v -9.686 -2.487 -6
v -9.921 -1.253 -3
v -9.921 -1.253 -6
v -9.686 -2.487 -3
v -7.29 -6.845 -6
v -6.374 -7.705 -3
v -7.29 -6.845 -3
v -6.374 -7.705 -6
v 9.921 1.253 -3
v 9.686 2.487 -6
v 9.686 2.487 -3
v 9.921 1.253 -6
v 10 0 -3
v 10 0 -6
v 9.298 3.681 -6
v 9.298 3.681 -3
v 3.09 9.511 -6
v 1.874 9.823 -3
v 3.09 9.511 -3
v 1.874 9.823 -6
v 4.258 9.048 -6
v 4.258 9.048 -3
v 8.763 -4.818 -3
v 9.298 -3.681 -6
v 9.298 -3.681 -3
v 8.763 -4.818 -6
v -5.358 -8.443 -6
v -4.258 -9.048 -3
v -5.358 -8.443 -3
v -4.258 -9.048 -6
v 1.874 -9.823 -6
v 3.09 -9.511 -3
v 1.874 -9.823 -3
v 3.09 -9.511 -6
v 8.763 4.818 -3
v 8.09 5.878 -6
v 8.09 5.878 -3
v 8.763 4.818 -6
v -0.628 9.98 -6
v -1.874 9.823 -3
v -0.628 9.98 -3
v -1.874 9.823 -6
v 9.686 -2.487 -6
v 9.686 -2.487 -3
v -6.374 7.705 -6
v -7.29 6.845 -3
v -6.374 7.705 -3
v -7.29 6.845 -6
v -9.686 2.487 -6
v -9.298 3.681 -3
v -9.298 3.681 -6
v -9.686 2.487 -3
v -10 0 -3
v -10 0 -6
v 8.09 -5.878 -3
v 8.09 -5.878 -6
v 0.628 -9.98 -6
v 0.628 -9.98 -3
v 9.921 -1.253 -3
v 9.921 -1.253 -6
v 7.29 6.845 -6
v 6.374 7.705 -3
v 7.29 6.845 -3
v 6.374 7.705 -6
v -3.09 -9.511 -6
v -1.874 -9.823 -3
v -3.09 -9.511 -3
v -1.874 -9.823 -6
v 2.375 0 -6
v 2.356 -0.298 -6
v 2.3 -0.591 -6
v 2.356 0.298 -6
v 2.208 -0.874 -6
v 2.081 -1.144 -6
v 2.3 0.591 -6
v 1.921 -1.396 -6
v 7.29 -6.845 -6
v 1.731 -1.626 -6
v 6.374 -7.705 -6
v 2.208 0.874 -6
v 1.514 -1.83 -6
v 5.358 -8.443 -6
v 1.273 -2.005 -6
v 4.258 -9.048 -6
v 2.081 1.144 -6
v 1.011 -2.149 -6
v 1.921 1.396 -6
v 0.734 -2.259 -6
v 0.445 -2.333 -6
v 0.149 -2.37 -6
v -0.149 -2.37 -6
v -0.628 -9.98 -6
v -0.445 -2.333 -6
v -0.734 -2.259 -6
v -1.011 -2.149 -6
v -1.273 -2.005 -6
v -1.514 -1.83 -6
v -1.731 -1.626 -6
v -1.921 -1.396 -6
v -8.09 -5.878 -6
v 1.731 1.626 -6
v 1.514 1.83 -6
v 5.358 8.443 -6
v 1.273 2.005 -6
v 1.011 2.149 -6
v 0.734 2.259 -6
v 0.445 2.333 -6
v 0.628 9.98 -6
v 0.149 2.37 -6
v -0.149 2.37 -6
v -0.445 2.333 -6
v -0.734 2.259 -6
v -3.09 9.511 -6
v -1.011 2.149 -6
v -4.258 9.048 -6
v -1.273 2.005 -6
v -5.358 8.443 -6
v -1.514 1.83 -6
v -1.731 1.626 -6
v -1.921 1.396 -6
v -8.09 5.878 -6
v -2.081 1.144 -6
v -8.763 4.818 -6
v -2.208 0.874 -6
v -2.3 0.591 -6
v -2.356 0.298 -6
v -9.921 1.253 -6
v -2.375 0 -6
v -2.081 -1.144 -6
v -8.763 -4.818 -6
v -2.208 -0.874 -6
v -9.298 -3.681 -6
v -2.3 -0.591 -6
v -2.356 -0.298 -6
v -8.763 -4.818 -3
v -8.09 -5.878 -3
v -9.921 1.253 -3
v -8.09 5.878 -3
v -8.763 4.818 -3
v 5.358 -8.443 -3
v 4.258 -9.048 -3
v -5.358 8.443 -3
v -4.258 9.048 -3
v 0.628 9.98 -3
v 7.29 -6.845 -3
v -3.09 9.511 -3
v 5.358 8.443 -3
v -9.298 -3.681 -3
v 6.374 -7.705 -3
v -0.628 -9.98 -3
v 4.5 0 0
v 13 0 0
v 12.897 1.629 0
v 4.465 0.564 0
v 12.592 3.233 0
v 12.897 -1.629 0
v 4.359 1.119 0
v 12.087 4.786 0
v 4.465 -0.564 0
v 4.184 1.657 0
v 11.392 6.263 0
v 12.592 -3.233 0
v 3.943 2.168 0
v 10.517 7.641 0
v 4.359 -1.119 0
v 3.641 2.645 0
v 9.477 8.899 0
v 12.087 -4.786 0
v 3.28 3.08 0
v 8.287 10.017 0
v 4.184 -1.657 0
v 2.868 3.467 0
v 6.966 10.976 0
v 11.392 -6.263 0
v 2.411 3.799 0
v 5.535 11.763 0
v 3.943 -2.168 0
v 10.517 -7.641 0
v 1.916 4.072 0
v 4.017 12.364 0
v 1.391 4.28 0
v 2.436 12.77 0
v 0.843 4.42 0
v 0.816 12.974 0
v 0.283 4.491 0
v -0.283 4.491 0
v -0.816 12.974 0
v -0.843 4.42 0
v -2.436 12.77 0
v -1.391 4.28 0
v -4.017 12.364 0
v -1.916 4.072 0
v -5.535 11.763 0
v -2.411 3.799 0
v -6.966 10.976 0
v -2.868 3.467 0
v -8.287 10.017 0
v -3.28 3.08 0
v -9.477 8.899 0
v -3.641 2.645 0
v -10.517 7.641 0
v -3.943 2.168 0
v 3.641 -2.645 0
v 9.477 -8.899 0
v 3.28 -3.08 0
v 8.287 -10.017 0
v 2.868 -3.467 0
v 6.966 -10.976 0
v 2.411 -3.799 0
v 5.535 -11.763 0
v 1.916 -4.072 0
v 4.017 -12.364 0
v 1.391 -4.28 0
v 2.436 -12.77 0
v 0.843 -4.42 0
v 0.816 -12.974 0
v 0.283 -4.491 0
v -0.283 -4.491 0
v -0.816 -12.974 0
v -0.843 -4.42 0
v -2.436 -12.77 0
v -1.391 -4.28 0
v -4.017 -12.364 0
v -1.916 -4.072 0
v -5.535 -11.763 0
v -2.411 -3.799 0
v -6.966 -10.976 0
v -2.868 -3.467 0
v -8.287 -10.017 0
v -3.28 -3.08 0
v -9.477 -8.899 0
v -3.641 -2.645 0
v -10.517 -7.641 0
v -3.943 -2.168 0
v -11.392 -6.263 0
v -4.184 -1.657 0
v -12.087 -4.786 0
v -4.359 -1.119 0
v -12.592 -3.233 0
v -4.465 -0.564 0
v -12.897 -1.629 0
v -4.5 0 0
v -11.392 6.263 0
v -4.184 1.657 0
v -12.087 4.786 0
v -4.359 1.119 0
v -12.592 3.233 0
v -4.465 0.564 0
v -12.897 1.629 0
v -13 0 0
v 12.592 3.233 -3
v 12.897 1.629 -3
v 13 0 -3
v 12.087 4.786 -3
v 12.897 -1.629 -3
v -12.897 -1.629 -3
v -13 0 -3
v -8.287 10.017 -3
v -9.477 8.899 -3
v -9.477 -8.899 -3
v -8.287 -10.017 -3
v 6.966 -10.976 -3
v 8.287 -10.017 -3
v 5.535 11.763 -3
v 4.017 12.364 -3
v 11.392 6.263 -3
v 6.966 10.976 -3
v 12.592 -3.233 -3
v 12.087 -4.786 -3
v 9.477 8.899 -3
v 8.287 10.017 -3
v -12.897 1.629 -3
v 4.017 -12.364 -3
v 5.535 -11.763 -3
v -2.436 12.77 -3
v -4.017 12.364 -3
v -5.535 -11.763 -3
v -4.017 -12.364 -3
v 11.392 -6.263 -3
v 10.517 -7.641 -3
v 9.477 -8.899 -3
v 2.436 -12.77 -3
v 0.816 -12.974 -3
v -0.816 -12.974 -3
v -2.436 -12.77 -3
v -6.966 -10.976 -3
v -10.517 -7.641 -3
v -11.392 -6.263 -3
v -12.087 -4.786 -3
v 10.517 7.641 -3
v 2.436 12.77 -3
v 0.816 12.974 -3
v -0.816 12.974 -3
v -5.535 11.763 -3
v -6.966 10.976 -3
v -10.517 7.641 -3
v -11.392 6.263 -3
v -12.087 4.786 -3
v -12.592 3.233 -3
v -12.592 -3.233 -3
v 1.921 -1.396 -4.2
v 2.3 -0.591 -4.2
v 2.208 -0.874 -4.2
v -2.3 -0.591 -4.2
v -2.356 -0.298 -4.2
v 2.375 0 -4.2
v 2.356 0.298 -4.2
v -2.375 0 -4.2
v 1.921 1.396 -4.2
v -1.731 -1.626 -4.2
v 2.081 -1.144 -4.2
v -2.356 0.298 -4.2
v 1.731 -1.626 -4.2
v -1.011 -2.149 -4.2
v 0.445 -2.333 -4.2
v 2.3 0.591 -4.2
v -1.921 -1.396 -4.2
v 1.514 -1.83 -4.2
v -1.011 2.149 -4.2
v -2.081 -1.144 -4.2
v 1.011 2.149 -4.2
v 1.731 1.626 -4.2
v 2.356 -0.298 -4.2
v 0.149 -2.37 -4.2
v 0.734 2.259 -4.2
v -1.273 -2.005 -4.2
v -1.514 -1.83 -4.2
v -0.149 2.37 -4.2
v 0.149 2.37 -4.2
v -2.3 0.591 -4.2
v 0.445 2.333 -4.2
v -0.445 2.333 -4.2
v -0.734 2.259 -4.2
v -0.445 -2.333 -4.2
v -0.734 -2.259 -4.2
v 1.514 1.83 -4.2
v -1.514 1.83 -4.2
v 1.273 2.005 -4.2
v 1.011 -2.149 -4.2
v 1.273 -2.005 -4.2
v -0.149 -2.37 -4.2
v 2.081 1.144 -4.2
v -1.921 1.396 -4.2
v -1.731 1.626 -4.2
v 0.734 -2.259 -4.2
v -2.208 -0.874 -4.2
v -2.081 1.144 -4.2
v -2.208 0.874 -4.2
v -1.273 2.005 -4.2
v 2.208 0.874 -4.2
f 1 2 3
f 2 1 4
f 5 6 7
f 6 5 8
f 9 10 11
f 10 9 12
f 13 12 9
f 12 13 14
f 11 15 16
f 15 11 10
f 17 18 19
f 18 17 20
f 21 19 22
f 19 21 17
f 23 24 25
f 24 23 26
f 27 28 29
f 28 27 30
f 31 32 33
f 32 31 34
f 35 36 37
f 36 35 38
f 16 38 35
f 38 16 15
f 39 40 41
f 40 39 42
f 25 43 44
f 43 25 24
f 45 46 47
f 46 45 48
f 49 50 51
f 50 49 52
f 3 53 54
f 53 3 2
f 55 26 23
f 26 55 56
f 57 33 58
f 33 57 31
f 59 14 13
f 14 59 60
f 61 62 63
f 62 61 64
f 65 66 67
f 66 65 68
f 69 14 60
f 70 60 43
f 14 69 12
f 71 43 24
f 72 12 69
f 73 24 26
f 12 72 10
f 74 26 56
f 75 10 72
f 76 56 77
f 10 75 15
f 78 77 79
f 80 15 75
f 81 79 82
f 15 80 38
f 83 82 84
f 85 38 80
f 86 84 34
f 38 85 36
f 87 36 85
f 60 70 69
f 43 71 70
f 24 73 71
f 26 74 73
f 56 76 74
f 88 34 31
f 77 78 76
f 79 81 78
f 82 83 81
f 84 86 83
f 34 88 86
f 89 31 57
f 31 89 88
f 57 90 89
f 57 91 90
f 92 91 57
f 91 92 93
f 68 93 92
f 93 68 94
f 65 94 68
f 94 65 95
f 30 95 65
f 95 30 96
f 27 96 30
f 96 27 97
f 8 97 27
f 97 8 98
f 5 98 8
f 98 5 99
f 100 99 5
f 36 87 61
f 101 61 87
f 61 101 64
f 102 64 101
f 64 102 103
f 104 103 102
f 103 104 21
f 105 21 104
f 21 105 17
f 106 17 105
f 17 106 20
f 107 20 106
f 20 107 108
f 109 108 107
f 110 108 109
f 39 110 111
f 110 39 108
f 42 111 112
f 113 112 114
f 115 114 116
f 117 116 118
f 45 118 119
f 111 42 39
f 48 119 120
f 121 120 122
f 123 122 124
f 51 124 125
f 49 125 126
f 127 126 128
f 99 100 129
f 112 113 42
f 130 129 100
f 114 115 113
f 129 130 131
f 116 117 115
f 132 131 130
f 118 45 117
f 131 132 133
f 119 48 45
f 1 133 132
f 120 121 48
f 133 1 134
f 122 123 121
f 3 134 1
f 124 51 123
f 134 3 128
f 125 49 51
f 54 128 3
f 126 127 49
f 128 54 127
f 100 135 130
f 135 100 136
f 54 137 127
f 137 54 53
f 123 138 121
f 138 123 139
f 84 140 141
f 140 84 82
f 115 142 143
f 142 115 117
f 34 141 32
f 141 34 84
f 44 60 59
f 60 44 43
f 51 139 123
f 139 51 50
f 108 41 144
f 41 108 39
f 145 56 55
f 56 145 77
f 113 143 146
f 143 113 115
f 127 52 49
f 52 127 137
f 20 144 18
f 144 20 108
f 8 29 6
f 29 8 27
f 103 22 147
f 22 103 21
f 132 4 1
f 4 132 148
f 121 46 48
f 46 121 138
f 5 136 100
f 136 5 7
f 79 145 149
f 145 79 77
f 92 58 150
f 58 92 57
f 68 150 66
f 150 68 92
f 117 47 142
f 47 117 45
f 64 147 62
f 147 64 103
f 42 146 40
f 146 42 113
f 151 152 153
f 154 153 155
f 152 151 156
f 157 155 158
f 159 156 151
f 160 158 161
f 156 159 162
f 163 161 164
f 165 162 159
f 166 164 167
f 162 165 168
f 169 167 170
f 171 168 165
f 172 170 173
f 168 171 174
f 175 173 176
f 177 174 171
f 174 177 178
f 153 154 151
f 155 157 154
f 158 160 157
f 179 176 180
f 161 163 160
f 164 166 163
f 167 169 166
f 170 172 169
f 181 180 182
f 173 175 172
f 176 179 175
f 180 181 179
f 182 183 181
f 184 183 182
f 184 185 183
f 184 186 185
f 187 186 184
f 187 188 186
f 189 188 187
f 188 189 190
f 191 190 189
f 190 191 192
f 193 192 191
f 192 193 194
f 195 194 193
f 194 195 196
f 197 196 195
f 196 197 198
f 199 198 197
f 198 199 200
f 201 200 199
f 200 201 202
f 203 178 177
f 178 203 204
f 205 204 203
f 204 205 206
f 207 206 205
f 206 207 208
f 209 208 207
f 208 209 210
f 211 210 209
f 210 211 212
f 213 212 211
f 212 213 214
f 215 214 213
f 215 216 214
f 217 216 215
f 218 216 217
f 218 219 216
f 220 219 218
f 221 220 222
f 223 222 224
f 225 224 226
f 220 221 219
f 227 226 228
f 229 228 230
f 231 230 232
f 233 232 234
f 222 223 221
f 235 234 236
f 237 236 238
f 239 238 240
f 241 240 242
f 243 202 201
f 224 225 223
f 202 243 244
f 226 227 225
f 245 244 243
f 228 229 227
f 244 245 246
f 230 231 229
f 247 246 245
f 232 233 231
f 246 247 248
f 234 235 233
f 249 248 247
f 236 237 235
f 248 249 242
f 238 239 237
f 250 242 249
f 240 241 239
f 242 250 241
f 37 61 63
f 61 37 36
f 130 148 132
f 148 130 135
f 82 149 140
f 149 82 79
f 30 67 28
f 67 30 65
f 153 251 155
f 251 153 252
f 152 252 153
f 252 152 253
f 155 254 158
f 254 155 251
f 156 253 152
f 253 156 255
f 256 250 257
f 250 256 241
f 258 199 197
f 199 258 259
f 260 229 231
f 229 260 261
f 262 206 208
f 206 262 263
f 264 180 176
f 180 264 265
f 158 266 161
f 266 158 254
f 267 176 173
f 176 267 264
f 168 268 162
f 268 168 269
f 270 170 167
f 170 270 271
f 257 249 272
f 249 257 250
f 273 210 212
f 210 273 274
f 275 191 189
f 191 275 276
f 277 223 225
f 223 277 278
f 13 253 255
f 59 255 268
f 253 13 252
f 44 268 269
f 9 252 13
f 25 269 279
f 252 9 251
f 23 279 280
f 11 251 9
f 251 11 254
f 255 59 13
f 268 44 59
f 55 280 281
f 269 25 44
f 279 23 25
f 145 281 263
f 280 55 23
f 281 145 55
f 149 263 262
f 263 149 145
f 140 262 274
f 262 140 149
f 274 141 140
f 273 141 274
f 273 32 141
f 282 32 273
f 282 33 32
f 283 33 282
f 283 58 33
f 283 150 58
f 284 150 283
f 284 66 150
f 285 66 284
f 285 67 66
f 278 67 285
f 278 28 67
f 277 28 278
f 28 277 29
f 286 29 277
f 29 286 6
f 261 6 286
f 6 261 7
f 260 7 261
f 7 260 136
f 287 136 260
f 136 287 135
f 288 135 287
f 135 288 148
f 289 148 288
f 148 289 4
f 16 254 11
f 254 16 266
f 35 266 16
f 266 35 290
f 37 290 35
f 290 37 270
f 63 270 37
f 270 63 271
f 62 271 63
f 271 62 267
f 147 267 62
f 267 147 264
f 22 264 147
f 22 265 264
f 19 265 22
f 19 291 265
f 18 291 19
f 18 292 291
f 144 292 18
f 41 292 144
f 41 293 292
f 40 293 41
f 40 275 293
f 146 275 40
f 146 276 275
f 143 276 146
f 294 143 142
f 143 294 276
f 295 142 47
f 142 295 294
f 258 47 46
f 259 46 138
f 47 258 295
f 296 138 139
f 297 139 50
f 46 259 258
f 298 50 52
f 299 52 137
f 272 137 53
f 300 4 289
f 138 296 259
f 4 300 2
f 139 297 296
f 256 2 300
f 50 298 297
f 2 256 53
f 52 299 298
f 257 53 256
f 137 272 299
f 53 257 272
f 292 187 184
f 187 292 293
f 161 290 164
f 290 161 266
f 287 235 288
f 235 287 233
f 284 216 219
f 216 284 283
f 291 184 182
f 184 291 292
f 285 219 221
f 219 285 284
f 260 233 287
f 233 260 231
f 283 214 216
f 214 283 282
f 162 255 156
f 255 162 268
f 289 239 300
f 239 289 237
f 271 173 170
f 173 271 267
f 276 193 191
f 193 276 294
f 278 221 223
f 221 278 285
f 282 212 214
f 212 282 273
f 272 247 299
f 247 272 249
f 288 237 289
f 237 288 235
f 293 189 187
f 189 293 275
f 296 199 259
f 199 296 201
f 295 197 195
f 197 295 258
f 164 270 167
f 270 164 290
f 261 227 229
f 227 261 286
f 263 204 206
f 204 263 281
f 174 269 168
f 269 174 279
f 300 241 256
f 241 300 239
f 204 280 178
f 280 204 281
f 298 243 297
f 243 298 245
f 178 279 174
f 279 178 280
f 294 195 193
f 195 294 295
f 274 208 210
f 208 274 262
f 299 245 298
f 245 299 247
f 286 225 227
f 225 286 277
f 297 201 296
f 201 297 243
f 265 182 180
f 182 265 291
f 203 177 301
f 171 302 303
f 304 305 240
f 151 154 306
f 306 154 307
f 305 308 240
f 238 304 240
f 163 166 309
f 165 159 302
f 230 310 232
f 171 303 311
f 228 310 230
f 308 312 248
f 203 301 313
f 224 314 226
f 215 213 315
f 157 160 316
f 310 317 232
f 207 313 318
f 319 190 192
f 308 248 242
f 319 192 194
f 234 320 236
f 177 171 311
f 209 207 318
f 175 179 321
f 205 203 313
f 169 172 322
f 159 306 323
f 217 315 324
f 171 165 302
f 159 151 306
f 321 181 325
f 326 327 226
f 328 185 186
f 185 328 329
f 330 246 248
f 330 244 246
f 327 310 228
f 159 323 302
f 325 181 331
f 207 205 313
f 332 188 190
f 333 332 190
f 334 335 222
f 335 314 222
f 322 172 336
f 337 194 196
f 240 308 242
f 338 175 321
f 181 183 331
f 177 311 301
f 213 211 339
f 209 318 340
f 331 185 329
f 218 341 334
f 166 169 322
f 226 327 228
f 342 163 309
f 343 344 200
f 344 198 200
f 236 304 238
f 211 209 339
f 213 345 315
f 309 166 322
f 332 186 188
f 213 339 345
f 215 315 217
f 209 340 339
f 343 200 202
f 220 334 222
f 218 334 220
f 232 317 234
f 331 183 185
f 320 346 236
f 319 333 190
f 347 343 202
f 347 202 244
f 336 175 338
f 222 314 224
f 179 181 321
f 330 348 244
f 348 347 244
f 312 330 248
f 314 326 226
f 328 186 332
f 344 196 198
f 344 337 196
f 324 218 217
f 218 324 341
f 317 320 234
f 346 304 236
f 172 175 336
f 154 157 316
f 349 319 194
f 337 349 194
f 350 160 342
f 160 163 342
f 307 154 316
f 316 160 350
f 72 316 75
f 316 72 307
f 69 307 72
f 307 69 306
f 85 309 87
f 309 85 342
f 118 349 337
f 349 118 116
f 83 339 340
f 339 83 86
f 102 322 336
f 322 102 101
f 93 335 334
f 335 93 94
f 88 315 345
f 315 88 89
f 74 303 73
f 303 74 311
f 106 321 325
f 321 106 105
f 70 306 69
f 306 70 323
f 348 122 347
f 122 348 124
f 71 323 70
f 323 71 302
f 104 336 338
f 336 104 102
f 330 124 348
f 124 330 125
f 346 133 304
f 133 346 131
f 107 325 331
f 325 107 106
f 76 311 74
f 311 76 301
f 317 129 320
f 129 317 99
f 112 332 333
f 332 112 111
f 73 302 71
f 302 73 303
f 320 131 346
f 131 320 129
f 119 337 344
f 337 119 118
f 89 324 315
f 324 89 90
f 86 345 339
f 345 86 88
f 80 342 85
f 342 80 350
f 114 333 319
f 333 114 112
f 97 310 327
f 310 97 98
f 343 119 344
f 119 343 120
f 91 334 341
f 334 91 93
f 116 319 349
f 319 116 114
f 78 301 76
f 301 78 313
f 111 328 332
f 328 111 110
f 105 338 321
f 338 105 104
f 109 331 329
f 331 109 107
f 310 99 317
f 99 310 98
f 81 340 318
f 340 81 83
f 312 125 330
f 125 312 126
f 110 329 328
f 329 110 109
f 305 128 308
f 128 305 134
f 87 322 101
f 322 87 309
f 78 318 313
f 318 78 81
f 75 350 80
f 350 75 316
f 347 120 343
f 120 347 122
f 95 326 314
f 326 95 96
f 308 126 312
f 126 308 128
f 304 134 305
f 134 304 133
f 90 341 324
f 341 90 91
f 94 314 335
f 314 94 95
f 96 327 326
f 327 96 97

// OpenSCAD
$fn = 50;


difference() {
	union() {
		translate(v = [0, 0, -6.0000000000]) {
			cylinder(h = 6, r = 10.0000000000);
		}
		translate(v = [0, 0, -3.0000000000]) {
			cylinder(h = 3, r = 13.0000000000);
		}
	}
	union() {
		translate(v = [0, 0, 0]) {
			rotate(a = [0, 0, 0]) {
				difference() {
					union() {
						#translate(v = [0, 0, -6.0000000000]) {
							cylinder(h = 6, r = 2.2500000000);
						}
						#translate(v = [0, 0, -4.2000000000]) {
							cylinder(h = 4.2000000000, r1 = 2.3750000000, r2 = 4.5000000000);
						}
						#translate(v = [0, 0, -6.0000000000]) {
							cylinder(h = 6, r = 2.3750000000);
						}
						#translate(v = [0, 0, -6.0000000000]) {
							cylinder(h = 6, r = 2.2500000000);
						}
					}
					union();
				}
			}
		}
	}
}
